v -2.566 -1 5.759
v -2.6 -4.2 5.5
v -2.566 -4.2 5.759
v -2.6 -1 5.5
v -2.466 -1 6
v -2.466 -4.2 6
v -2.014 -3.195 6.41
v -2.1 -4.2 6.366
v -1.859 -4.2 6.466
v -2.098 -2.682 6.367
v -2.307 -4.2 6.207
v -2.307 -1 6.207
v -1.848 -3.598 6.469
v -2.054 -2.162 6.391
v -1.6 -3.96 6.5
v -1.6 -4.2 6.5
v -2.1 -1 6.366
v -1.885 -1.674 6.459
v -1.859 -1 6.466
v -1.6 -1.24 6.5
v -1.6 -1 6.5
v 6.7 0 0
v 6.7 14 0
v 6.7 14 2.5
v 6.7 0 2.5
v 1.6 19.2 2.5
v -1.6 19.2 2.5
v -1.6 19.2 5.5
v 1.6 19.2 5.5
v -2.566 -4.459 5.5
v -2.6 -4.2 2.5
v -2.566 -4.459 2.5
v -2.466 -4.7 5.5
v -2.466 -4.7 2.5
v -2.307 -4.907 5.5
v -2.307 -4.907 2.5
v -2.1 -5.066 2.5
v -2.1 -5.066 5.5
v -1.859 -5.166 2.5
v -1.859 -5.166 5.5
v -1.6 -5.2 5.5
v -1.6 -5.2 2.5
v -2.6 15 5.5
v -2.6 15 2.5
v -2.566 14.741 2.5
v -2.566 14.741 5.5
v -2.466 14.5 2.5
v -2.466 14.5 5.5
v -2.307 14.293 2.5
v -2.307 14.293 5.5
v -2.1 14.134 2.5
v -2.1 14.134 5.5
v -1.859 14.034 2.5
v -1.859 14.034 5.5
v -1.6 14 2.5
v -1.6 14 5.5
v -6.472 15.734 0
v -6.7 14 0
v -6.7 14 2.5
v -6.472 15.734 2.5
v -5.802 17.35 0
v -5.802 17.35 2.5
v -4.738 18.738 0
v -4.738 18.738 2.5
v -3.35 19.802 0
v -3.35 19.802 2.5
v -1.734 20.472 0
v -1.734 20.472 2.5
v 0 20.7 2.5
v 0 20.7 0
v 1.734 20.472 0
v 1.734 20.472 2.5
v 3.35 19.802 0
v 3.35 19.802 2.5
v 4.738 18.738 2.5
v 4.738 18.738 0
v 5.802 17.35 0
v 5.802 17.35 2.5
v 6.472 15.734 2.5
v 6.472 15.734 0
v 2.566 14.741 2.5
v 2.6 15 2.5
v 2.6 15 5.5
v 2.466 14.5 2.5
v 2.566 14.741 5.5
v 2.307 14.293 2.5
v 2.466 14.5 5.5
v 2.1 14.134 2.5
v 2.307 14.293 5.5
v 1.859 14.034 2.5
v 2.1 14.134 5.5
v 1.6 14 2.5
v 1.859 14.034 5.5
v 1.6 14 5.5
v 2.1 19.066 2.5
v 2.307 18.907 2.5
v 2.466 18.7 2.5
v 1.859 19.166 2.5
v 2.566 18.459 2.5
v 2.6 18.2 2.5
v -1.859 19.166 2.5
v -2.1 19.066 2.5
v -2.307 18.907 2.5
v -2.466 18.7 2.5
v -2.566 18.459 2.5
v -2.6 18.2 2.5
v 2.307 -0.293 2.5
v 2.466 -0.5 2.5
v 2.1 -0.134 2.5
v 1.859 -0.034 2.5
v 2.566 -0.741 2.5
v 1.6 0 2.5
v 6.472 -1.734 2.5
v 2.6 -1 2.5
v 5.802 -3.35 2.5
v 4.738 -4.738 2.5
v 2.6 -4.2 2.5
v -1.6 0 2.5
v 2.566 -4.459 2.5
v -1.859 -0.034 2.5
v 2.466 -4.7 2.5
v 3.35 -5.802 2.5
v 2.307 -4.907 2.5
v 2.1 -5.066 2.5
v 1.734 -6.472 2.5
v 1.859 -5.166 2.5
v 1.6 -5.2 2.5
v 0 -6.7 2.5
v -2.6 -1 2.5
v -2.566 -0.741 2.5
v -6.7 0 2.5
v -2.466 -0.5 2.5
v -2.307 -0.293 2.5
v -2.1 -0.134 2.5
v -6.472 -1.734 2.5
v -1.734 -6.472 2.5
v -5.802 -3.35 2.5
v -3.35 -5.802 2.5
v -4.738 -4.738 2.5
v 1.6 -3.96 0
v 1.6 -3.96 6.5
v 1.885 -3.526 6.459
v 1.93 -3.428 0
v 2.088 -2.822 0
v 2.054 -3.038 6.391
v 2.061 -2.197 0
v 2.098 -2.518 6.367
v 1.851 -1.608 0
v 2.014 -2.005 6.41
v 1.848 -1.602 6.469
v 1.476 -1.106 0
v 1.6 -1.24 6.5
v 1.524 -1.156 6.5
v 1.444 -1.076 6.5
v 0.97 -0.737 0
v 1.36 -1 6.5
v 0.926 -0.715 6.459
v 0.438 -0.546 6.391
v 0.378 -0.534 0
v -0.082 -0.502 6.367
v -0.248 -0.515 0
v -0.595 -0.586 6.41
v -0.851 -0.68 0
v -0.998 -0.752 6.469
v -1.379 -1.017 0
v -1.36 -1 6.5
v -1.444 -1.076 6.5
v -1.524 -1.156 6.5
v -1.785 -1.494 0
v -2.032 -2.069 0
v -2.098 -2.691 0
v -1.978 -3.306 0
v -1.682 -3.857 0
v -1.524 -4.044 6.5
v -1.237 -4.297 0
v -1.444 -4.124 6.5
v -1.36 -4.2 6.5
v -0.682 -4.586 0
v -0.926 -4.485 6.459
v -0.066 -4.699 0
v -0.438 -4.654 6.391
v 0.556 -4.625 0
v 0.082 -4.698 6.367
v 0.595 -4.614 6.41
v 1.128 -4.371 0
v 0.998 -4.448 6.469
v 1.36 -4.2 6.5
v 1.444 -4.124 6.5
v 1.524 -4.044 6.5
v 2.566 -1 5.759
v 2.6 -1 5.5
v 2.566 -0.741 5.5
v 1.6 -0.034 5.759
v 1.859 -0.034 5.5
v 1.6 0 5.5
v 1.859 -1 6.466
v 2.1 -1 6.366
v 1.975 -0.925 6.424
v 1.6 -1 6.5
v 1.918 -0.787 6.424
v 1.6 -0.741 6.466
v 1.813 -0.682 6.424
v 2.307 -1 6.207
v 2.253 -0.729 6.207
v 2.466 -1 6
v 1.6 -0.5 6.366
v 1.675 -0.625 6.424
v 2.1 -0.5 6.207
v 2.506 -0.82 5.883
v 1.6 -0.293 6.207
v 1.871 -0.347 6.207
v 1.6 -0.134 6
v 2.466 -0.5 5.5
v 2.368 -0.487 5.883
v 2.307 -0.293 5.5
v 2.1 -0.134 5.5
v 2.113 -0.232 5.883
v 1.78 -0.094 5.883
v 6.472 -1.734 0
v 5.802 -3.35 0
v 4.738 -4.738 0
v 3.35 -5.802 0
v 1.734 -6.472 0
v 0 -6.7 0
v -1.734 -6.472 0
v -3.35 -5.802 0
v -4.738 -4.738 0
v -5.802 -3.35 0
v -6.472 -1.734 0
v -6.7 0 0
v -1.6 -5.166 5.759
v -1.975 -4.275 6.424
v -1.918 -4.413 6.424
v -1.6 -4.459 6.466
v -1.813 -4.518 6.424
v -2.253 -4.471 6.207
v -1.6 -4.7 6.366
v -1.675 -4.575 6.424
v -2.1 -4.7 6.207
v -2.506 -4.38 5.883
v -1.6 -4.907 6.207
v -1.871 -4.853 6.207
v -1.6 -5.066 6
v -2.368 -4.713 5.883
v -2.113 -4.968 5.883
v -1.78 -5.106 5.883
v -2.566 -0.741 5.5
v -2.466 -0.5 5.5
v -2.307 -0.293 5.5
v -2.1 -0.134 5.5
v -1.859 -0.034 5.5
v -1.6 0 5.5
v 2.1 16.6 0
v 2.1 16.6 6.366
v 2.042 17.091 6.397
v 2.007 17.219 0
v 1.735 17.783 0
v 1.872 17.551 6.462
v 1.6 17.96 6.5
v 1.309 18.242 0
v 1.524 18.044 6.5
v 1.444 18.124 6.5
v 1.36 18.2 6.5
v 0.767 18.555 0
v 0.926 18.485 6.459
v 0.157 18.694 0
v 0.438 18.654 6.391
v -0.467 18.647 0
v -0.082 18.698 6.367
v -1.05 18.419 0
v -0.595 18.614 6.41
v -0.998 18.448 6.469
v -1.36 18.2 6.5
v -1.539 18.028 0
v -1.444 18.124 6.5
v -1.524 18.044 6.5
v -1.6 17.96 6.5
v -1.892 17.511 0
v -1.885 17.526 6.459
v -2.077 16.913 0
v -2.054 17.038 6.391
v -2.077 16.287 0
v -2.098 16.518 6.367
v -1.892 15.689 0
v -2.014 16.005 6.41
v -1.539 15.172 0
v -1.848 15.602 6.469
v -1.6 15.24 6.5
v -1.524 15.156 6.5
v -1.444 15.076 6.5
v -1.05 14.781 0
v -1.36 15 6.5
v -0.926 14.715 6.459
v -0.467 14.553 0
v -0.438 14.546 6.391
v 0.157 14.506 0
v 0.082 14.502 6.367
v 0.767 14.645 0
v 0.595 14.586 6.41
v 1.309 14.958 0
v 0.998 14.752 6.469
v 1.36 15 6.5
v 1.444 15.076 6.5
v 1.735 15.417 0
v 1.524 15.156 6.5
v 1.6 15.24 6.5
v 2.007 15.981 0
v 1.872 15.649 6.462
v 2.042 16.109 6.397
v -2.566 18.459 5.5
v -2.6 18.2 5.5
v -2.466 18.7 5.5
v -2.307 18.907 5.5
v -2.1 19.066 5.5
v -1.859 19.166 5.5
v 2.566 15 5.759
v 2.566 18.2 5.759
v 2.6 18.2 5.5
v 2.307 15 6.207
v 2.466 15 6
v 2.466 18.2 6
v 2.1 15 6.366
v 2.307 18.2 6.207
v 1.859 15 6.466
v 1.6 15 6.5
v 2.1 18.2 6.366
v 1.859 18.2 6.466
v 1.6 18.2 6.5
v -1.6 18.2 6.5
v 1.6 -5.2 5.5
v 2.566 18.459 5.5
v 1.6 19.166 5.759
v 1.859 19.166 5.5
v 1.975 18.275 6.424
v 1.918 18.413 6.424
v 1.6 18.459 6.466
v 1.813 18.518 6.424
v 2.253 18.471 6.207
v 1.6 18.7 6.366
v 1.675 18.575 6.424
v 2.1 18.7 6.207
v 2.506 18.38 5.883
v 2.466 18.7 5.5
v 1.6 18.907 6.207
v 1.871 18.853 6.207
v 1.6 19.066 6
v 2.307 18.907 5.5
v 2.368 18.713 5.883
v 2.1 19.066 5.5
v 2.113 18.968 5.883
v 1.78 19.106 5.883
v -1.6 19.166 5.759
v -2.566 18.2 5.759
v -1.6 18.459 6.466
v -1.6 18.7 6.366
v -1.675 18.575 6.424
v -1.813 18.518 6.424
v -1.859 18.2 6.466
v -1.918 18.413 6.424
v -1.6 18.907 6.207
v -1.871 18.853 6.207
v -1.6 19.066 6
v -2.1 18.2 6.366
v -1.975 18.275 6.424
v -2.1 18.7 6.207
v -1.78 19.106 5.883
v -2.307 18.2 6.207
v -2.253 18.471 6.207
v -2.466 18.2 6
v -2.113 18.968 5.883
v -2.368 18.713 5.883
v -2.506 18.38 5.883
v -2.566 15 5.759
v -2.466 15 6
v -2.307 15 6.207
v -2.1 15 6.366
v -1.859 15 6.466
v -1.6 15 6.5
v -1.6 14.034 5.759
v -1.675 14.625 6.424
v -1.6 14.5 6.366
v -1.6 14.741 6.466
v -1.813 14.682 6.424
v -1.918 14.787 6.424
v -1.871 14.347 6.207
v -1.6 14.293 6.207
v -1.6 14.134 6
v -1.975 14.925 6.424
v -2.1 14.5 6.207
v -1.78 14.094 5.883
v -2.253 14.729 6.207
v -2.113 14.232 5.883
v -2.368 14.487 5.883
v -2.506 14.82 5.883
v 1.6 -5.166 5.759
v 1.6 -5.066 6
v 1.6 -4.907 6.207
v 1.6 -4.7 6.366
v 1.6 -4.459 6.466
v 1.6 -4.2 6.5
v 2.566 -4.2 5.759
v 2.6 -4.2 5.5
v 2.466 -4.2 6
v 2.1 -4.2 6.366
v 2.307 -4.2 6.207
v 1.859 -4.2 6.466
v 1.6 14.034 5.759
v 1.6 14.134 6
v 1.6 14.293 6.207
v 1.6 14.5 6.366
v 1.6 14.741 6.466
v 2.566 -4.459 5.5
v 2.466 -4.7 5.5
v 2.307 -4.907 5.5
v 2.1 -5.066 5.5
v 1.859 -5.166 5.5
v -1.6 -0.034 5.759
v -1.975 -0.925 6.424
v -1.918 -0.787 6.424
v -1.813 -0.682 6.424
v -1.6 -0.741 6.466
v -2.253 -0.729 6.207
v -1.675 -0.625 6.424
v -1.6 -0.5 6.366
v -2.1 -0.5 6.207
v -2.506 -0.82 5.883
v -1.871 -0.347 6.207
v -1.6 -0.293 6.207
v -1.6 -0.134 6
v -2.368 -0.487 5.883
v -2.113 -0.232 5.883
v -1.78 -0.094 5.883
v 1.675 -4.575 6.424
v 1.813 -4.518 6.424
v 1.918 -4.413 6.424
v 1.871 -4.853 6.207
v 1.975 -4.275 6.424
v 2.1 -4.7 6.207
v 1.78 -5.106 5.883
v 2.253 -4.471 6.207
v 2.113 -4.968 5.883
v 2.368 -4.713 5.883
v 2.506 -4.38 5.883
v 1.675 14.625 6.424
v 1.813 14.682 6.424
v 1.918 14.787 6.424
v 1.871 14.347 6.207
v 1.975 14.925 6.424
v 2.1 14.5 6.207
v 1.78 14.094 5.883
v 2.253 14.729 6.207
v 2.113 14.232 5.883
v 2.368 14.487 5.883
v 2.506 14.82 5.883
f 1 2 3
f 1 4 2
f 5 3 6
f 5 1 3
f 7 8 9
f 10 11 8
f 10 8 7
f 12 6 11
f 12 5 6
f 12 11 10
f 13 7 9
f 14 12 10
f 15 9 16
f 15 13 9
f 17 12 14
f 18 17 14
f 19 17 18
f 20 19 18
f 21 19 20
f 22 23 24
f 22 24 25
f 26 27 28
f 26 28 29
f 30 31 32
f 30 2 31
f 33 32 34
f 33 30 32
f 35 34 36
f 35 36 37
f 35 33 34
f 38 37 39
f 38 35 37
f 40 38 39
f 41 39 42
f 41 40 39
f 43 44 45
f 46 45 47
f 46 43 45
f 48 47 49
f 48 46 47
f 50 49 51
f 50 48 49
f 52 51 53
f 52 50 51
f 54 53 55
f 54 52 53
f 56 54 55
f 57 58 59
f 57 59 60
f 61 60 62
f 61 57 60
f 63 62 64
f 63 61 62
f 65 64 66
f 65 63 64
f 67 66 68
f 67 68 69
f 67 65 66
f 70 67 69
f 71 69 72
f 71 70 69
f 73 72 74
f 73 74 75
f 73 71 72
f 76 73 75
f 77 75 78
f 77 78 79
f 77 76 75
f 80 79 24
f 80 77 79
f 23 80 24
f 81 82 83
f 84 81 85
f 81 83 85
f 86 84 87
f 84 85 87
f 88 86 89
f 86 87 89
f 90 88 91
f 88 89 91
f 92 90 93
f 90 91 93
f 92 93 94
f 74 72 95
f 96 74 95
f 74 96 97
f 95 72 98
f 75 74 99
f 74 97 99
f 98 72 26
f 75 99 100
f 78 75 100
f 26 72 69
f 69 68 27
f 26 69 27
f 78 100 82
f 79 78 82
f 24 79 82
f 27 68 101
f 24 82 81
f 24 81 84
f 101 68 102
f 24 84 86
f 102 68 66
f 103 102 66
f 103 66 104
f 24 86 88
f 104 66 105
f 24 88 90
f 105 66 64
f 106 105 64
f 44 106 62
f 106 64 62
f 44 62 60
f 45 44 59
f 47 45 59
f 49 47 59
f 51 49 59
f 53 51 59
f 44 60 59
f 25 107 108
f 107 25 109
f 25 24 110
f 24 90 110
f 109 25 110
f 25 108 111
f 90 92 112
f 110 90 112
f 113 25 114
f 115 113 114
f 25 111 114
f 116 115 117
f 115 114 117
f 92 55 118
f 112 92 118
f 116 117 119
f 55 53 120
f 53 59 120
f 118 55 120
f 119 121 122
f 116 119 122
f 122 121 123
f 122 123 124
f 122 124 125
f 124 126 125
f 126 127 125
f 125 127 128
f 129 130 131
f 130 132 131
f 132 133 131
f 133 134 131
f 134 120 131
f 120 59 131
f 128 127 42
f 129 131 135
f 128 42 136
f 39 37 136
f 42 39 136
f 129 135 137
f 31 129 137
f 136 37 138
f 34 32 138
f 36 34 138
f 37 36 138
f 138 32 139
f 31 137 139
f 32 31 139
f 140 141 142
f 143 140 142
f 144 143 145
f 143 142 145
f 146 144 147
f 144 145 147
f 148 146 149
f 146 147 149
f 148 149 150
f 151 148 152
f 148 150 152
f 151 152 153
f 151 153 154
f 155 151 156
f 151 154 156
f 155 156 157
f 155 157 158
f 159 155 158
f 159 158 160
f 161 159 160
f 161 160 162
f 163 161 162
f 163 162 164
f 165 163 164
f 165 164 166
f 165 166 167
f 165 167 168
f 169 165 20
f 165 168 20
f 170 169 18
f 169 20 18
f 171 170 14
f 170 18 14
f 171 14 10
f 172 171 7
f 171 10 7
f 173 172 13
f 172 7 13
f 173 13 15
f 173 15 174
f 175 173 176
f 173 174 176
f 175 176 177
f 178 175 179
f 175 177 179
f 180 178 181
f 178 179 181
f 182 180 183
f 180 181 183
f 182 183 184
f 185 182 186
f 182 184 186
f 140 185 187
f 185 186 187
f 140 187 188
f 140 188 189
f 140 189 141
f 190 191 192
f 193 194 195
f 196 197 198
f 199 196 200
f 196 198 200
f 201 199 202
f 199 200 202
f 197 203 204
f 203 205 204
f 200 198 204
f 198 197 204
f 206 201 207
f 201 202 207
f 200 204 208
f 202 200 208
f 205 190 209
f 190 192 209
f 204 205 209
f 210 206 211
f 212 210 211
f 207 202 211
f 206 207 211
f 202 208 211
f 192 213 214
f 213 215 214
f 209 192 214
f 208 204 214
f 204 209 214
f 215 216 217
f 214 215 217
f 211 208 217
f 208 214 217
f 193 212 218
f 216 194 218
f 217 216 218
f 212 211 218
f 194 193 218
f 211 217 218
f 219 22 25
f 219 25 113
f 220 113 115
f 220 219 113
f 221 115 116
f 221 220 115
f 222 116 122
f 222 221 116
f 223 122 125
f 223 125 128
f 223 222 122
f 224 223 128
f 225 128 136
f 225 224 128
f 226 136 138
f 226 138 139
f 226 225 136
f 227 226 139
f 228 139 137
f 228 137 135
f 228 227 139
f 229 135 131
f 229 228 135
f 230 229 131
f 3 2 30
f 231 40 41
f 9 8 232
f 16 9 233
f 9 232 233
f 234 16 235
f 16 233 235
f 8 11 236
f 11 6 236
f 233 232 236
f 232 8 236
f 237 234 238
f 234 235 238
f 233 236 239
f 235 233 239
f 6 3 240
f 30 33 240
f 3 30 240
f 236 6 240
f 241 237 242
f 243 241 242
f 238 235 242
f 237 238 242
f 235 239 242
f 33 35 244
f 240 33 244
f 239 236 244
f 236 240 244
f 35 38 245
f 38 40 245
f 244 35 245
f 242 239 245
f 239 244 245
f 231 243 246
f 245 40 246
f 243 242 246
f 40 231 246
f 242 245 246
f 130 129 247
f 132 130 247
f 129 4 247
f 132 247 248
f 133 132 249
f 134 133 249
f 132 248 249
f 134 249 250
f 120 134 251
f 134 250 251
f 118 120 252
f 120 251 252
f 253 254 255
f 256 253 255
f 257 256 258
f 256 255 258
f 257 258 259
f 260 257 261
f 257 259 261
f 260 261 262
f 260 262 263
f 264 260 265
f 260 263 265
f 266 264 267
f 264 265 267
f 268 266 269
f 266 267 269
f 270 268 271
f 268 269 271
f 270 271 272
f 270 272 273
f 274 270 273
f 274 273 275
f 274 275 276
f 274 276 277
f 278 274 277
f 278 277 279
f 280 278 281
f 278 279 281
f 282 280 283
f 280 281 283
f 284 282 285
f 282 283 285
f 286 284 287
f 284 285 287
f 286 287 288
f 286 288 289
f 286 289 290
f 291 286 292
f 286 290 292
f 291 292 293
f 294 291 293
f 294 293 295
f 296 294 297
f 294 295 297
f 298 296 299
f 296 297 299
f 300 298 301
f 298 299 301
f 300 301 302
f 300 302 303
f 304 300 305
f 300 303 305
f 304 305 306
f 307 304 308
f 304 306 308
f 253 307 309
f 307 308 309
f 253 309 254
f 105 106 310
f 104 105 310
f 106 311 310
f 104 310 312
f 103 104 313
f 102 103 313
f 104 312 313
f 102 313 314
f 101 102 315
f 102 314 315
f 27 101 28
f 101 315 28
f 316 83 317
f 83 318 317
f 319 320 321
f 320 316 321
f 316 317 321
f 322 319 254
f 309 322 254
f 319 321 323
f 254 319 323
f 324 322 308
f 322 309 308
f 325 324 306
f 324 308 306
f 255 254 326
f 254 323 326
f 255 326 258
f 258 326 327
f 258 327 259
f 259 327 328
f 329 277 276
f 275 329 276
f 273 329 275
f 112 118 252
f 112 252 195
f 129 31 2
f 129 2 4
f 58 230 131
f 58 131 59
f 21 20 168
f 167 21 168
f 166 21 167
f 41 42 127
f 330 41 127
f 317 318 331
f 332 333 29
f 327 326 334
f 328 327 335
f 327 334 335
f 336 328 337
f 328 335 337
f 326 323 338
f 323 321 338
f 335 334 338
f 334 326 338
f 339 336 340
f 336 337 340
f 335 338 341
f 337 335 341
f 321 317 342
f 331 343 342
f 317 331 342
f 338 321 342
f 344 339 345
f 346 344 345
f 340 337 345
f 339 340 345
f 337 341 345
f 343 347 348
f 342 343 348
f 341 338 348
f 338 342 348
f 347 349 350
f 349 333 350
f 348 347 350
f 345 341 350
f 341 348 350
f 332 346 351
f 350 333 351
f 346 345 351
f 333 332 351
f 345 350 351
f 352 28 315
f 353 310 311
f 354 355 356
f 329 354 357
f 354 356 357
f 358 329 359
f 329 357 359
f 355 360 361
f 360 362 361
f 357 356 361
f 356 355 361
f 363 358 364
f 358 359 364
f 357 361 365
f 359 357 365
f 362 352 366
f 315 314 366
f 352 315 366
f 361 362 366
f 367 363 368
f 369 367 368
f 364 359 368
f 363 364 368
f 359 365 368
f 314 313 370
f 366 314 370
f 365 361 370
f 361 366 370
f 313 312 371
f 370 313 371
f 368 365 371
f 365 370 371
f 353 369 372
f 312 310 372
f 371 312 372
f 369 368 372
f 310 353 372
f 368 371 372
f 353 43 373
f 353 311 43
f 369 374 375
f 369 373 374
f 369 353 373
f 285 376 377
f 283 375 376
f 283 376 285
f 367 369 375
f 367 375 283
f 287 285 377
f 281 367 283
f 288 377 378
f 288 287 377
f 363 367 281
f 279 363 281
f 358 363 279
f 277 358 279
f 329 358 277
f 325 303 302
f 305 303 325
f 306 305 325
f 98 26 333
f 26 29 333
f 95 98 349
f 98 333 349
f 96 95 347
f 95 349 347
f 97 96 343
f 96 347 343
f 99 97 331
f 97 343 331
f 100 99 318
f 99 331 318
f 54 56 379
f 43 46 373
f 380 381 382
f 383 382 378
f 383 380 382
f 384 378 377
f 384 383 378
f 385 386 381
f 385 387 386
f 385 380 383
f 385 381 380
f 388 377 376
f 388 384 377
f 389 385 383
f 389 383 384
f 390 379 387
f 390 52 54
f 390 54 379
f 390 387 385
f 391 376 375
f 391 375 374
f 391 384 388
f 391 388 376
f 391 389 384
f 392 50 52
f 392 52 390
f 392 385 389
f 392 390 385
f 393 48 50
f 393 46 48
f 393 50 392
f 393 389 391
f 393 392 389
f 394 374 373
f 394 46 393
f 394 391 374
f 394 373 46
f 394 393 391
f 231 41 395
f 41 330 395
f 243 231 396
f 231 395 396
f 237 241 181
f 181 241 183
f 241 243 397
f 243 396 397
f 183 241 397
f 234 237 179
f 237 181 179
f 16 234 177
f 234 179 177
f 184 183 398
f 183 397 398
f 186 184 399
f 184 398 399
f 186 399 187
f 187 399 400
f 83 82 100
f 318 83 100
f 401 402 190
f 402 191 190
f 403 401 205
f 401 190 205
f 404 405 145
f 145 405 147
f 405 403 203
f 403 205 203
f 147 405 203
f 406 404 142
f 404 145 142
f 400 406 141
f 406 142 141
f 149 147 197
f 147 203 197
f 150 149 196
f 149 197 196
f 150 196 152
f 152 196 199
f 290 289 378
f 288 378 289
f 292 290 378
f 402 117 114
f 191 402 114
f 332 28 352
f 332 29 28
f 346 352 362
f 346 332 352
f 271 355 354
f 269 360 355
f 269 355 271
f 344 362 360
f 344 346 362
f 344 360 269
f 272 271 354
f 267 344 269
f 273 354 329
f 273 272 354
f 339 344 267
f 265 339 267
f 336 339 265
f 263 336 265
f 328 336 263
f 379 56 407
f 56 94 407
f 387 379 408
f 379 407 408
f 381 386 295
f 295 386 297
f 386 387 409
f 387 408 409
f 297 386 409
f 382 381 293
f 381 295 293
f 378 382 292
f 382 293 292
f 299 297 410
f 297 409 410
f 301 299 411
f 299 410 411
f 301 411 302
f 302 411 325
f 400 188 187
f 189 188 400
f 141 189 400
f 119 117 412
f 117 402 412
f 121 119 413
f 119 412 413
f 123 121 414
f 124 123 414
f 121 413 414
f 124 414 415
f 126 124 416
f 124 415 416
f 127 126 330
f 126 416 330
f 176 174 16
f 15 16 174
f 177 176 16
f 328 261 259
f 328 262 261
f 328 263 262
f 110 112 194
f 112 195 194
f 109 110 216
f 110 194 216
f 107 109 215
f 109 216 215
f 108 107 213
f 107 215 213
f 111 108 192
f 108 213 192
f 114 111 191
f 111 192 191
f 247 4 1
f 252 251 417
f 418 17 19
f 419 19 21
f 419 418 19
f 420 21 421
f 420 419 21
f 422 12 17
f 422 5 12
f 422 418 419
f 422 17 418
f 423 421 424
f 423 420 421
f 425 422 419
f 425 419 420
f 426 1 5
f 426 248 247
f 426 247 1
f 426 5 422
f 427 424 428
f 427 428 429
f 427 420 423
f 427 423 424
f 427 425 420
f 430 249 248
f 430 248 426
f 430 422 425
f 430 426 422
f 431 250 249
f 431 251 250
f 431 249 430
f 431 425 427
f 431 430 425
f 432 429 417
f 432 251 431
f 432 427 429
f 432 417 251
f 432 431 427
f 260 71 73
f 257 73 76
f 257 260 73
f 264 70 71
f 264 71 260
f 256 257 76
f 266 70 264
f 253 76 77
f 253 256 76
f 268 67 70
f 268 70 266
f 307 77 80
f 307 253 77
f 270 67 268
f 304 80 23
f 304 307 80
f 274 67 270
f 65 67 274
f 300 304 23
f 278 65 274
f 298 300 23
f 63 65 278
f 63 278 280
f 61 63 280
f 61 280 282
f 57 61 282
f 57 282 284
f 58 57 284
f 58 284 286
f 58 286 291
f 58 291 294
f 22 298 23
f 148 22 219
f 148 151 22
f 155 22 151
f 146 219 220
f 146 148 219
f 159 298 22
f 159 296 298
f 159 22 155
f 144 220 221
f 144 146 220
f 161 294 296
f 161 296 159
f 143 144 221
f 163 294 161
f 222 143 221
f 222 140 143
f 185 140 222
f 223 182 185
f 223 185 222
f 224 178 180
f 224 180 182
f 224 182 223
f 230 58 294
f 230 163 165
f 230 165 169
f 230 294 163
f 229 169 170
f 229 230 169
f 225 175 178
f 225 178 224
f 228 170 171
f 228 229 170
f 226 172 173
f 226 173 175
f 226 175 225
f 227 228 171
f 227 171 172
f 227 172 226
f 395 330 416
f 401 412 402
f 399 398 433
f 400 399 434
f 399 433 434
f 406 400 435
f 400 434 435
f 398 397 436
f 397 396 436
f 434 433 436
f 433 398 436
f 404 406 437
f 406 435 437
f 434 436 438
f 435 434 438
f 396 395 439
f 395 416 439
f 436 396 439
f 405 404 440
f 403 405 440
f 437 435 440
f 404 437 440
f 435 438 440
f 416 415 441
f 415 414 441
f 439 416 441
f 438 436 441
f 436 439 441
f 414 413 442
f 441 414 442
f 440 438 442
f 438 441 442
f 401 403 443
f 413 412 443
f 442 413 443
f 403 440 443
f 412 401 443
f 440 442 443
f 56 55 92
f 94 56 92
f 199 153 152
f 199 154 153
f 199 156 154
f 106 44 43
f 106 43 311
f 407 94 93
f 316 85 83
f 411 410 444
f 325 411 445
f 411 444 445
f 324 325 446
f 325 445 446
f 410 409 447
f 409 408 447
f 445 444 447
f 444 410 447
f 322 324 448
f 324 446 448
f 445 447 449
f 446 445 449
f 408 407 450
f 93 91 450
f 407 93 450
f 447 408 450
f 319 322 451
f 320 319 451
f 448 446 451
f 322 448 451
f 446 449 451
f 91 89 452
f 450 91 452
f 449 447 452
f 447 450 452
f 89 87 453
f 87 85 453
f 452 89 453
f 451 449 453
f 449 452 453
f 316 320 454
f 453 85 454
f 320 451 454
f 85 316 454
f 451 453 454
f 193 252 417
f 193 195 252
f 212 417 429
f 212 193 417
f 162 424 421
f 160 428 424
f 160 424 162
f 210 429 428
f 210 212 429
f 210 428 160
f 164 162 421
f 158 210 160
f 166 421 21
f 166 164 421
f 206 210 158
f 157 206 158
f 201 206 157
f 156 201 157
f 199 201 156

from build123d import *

# Parameters (mm, degrees)
BOSS_EXTRUDE1_DEPTH = 2.5
SKETCH2_W           = 5.2
SKETCH2_H           = 5.2
BOSS_EXTRUDE2_DEPTH = 4
FILLET1_R           = 1
SKETCH3_R           = 2.1
CUT_EXTRUDE1_DEPTH  = 23.707487752


with BuildPart() as part:
    # Sketch1 → Boss-Extrude1 (new body)
    with BuildSketch(Plane(origin=(0, 0, 0), x_dir=(0, 1, 0), z_dir=(0, 0, 1))):
        with BuildLine():
            Line((0, 6.7), (14, 6.7))
            ThreePointArc((14, 6.7), (20.7, 0), (14, -6.7))
            Line((14, -6.7), (0, -6.7))
            ThreePointArc((0, -6.7), (-6.7, 0), (0, 6.7))
        make_face()
    extrude(amount=BOSS_EXTRUDE1_DEPTH)

    # Sketch2 → Boss-Extrude2 (add)
    with BuildSketch(Plane.XY.offset(2.5)):
        with Locations((0, -2.6)):
            Rectangle(SKETCH2_W, SKETCH2_H)
        with Locations((0, 16.6)):
            Rectangle(SKETCH2_W, SKETCH2_H)
    extrude(amount=BOSS_EXTRUDE2_DEPTH)

    # Fillet1
    fillet1_edges = [part.edges().sort_by_distance(p)[0] for p in [
        (-2.6, 0, 4.5),
        (-2.6, -5.2, 4.5),
        (2.6, -5.2, 4.5),
        (2.6, 0, 4.5),
        (-2.6, -2.6, 6.5),
        (0, -5.2, 6.5),
        (2.6, -2.6, 6.5),
        (0, 0, 6.5),
        (-2.6, 14, 4.5),
        (2.6, 14, 4.5),
        (2.6, 19.2, 4.5),
        (-2.6, 19.2, 4.5),
        (0, 14, 6.5),
        (2.6, 16.6, 6.5),
        (0, 19.2, 6.5),
        (-2.6, 16.6, 6.5),
    ]]
    fillet(fillet1_edges, radius=FILLET1_R)

    # Sketch3 → Cut-Extrude1 (cut, through all)
    with BuildSketch(Plane.XY.offset(6.5)):
        with Locations((0, 16.6)):
            Circle(SKETCH3_R)
        with Locations(Location((0, -2.6, 0), (0, 0, 319.632406456))):
            Circle(SKETCH3_R)
    extrude(amount=-CUT_EXTRUDE1_DEPTH, mode=Mode.SUBTRACT)


solid = part.part
